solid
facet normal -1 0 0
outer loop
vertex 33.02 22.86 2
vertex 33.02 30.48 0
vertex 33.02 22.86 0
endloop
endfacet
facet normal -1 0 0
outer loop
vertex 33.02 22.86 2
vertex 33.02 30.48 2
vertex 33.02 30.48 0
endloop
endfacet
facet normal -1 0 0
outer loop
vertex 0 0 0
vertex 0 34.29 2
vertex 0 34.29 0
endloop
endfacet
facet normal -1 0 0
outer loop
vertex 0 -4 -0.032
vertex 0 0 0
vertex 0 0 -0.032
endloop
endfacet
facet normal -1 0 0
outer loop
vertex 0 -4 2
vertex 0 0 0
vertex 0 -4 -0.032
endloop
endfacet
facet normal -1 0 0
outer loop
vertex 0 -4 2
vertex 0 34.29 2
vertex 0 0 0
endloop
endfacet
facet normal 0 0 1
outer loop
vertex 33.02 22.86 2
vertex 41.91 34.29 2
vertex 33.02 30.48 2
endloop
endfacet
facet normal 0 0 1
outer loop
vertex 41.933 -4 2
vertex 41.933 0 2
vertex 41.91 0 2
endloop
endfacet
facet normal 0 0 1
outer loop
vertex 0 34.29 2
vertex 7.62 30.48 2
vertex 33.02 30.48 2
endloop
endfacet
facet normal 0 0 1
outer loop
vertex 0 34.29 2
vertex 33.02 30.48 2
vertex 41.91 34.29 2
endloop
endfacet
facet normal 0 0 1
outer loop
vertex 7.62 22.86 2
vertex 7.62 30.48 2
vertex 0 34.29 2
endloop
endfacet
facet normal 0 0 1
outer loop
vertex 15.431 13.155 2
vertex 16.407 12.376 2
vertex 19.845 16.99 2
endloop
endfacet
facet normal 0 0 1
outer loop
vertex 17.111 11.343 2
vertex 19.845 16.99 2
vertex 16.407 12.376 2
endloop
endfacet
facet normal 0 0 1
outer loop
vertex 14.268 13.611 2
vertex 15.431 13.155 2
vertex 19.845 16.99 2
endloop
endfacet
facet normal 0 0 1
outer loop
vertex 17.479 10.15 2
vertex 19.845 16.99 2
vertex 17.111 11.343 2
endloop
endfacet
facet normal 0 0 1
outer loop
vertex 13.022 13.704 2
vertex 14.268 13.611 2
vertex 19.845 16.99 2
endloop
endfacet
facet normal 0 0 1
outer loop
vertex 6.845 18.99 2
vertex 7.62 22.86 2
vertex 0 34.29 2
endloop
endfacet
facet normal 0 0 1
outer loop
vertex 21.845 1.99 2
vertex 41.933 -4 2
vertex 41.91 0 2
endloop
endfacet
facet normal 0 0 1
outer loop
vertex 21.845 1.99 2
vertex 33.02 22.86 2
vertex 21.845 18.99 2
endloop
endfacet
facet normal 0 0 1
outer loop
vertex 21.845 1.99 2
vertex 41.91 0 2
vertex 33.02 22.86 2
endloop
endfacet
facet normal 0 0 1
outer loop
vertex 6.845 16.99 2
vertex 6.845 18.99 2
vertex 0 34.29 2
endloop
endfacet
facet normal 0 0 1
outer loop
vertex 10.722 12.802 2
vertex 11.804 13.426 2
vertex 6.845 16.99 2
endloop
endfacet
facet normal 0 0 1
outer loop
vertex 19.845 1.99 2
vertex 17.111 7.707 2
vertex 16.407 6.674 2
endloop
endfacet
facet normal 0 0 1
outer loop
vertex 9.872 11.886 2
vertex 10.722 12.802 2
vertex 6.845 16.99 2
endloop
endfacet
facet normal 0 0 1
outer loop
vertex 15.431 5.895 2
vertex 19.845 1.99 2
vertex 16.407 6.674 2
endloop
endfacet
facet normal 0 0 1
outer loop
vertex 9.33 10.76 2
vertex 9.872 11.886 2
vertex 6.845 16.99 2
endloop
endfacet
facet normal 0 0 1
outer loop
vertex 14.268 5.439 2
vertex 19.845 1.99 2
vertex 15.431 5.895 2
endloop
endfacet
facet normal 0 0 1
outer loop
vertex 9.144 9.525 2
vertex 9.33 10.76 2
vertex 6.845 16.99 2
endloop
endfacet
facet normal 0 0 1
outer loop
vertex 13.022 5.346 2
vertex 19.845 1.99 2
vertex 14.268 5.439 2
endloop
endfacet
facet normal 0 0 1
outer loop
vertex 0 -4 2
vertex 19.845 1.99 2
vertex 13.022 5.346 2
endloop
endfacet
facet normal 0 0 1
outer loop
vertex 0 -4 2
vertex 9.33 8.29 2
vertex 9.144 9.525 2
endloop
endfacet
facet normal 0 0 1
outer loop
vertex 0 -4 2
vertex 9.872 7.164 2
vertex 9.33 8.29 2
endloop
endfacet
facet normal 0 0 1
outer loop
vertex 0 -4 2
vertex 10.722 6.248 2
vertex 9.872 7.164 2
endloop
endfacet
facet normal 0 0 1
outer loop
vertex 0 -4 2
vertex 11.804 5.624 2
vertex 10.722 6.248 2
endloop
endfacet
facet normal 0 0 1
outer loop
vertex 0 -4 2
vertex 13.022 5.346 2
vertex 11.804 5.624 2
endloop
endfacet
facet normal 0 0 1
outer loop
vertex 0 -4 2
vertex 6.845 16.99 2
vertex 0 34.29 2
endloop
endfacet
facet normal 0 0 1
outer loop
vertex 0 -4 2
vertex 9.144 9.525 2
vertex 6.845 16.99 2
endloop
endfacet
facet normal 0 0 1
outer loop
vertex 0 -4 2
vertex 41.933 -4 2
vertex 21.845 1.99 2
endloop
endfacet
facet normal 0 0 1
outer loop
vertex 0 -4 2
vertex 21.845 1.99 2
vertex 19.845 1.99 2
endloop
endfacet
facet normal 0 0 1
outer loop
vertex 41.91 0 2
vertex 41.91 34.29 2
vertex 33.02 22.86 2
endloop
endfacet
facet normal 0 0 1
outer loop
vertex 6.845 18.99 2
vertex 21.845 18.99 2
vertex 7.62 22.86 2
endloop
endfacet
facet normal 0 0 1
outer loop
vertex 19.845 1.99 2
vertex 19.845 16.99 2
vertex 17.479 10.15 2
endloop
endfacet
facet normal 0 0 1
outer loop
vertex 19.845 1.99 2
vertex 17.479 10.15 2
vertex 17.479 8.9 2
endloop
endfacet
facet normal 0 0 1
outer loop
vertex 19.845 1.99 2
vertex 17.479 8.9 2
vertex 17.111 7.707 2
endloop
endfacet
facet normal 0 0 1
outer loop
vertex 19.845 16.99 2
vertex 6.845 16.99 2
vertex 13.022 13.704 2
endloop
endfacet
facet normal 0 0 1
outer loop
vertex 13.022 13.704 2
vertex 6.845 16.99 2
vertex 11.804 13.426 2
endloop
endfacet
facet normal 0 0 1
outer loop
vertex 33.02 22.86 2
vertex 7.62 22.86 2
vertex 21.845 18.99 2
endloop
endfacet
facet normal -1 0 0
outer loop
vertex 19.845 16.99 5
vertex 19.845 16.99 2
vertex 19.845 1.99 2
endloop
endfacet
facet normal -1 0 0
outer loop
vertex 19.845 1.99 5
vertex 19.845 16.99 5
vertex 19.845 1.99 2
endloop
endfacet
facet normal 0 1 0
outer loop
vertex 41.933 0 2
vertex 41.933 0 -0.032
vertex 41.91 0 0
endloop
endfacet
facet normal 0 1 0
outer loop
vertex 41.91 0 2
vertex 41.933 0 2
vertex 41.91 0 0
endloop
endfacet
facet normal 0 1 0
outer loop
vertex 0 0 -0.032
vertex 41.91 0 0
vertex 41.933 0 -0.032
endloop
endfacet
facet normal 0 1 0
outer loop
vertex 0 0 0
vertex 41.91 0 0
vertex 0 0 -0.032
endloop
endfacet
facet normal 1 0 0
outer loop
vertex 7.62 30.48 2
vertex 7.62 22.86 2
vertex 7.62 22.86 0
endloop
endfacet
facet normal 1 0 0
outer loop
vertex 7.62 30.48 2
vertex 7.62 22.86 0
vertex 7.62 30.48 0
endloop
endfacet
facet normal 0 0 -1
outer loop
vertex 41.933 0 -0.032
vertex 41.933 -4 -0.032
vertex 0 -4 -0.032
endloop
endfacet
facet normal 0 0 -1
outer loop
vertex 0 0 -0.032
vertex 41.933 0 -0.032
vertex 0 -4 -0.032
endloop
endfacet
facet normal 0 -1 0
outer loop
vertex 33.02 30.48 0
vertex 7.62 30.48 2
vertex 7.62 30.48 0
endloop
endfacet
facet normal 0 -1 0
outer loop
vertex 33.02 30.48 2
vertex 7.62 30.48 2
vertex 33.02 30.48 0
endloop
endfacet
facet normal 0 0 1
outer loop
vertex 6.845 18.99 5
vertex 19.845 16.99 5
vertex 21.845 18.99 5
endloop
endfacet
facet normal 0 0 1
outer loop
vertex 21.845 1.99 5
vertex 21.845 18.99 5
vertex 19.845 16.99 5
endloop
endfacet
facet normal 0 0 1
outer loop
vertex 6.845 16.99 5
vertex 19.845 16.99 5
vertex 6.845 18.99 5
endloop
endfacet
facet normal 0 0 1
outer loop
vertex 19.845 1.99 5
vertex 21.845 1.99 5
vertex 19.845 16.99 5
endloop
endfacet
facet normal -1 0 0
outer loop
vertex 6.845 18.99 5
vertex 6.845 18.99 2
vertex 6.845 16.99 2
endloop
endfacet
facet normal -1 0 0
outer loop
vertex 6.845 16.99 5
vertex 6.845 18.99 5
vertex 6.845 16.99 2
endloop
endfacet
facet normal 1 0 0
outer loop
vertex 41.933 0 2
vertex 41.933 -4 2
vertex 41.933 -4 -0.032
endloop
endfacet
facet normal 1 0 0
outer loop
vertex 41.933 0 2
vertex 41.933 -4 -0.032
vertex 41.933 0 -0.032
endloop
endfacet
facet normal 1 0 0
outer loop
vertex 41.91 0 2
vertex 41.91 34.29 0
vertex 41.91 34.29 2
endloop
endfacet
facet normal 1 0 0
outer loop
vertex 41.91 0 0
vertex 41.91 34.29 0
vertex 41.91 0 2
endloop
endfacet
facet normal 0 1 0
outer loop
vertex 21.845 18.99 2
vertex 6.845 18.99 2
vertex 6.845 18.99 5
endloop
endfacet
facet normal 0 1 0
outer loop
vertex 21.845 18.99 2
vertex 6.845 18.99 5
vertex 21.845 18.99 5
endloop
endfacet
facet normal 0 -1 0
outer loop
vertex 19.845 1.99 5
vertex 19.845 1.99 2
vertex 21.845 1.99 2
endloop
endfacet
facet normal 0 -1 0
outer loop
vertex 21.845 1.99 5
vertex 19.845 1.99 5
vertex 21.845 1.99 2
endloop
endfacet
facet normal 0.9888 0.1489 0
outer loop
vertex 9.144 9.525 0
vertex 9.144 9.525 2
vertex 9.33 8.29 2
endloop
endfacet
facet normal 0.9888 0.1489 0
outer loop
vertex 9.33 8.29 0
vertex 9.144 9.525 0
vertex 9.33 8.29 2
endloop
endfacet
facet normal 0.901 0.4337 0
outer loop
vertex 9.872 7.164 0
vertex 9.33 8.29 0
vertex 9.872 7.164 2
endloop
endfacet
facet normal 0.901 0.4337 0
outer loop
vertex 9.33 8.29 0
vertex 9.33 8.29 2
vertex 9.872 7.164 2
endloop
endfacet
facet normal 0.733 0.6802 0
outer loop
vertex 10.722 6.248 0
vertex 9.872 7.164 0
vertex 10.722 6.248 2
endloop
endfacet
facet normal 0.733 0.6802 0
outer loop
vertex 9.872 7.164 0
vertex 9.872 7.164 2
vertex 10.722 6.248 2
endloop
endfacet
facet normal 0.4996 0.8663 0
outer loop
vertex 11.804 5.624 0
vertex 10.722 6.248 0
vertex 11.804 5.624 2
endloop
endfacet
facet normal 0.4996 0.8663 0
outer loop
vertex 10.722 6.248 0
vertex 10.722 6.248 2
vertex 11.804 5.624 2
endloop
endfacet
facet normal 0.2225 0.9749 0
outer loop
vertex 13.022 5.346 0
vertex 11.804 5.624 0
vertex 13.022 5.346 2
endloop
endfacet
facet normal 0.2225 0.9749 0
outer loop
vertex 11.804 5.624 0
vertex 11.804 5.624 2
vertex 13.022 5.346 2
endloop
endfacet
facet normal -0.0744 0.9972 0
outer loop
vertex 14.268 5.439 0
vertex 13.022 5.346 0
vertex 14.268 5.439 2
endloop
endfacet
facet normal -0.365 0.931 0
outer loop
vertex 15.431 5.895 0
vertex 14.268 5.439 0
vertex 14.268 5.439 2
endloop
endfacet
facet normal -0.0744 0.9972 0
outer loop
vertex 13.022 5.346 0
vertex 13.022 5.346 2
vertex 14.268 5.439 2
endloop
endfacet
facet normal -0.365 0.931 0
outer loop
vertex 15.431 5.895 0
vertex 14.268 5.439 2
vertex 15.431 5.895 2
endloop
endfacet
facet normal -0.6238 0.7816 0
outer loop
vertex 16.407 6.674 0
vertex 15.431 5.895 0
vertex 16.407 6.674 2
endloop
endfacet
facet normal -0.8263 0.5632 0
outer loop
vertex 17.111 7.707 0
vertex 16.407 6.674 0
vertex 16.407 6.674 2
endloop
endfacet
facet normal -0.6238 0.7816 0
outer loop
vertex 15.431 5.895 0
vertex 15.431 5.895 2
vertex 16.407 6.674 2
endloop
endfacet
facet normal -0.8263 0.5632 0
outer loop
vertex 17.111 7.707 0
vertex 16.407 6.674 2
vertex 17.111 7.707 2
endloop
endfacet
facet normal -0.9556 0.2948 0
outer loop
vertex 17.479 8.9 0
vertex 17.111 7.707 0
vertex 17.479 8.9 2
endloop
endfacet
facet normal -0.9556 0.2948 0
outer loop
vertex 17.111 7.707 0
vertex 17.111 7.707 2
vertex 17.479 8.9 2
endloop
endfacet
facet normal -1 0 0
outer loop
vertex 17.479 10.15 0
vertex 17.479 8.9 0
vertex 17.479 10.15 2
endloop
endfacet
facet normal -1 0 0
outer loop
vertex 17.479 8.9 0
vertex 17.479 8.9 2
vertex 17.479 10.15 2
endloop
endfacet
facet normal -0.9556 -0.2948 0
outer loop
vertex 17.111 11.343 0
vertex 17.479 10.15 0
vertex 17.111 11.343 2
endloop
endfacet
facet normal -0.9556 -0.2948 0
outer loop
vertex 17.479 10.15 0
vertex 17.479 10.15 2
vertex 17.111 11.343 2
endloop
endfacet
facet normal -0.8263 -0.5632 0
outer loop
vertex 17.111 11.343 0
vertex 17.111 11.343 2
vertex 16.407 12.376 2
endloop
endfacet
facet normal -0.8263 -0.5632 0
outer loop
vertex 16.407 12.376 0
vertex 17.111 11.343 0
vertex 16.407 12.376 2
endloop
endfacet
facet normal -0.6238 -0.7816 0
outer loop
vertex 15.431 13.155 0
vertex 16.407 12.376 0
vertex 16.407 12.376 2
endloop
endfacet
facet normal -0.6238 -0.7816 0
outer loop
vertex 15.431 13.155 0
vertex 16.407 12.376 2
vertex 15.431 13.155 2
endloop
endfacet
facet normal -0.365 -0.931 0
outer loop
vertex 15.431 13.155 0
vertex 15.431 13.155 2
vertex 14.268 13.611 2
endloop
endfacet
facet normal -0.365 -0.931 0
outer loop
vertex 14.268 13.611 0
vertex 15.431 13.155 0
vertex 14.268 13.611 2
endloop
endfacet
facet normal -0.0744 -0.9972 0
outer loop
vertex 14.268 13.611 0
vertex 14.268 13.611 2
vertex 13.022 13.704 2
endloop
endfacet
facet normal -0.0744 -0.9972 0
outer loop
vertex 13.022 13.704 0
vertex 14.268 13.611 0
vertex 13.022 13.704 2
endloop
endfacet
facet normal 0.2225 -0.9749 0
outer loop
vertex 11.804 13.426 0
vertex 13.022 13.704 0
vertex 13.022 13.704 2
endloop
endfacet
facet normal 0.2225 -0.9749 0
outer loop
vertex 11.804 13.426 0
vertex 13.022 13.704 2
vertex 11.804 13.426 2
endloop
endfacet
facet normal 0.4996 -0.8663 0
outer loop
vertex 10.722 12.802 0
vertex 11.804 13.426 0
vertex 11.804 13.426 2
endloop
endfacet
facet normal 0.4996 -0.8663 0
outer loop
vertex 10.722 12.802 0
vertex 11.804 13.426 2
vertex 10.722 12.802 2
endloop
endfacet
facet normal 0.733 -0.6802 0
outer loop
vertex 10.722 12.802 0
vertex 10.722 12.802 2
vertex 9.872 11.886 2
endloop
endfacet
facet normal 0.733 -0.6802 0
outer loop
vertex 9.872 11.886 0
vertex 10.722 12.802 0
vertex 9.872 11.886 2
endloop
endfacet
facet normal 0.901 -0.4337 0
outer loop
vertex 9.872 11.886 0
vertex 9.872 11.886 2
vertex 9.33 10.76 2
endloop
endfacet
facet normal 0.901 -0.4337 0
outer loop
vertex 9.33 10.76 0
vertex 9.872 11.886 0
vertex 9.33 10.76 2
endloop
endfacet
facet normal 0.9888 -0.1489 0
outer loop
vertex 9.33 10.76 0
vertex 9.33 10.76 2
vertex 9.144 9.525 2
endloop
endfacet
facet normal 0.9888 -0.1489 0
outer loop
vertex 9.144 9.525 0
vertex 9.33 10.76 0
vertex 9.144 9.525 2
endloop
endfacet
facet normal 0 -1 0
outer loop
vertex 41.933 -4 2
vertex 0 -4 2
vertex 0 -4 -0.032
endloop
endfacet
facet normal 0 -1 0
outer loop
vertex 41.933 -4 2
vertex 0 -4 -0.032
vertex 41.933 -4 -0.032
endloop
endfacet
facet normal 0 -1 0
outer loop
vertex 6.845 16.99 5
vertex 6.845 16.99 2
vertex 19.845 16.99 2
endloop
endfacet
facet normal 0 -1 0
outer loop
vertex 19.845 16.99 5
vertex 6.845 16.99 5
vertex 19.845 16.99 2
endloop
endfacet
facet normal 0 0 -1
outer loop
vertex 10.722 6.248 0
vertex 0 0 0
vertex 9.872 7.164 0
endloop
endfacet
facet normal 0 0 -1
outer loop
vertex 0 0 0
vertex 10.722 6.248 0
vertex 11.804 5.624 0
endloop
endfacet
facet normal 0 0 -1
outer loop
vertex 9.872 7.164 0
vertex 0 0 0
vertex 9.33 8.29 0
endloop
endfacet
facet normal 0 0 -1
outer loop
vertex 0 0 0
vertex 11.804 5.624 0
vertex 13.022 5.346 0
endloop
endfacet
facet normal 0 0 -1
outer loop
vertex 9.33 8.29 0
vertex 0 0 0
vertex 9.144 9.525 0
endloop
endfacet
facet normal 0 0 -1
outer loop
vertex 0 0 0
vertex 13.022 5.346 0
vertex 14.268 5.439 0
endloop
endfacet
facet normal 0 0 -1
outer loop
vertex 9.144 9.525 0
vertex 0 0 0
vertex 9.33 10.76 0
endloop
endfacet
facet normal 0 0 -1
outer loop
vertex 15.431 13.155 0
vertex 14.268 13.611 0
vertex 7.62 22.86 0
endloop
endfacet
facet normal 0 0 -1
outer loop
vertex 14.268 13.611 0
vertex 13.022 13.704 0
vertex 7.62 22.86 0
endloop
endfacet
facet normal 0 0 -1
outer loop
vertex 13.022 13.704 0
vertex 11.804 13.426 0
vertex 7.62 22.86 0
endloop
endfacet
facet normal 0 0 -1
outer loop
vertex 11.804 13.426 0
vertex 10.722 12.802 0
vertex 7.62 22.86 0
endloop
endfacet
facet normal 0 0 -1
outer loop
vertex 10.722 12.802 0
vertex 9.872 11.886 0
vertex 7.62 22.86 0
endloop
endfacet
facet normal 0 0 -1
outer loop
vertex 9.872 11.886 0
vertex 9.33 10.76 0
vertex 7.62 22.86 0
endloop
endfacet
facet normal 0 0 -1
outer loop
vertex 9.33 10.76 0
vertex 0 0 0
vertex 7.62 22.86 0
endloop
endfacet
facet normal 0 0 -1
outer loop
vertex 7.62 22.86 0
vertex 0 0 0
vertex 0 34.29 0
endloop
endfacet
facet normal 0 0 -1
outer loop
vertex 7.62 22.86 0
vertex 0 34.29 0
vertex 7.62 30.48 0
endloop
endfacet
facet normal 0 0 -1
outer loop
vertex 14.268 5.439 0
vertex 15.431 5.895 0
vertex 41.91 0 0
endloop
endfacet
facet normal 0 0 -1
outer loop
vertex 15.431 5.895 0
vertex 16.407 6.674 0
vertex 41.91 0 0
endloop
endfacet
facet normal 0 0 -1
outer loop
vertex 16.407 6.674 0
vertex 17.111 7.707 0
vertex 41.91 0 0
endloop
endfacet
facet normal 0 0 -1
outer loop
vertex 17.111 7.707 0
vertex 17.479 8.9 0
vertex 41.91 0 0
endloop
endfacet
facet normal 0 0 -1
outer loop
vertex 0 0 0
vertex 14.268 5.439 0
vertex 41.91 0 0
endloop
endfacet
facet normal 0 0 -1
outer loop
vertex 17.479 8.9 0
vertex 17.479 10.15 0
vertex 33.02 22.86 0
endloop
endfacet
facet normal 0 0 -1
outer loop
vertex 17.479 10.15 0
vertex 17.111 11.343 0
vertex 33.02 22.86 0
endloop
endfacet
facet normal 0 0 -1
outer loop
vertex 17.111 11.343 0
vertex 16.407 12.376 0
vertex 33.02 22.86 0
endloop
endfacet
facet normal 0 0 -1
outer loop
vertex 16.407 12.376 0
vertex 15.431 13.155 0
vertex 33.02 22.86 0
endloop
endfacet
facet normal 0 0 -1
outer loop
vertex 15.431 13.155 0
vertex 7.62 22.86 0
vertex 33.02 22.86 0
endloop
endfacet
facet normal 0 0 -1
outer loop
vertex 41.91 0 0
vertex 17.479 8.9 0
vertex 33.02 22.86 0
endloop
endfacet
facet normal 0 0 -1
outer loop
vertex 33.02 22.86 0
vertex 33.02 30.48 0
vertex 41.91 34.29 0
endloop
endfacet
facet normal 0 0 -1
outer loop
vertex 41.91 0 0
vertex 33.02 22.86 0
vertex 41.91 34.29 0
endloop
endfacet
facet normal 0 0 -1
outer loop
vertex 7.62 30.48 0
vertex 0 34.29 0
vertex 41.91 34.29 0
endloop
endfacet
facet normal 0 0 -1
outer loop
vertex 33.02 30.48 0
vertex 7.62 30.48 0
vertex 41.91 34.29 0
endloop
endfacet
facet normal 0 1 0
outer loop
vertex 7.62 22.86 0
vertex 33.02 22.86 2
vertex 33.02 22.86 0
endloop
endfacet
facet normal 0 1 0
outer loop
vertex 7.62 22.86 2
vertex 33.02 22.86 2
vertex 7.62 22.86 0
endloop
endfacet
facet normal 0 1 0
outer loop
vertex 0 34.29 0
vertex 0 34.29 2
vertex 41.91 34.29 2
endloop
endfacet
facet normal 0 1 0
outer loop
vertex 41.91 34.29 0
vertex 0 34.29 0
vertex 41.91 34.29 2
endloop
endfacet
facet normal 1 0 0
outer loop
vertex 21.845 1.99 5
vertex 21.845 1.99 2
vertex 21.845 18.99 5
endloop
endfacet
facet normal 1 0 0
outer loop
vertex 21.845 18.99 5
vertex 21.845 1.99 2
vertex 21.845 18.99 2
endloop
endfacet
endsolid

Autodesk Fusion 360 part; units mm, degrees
sketch "Sketch1" plane through (0, 0, 0) normal (0, 0, 1) x (1, 0, 0)
  line L0 (0, 0) -> (0, 38.1)
  line L1 (0, 38.1) -> (41.91, 38.1)
  line L2 (41.91, 38.1) -> (41.91, 0)
  line L3 (41.91, 0) -> (0, 0)
  dimension "d1" = 38.1
  dimension "d2" = 41.91
extrude "Extrude1" add sketch "Sketch1" along normal blind 2
sketch "Sketch3" plane through (0, 0, 2) normal (0, 0, 1) x (-1, 0, 0)
  line L0 (-41.91, 0) -> (-41.91, -38.1)
  line L1 (-41.91, -38.1) -> (0, -38.1)
  line L2 (0, -38.1) -> (0, 0)
  line L3 (0, 0) -> (-41.91, 0)
  circle A0 centre (-13.335, -9.525) radius 4.191
  line L4 (-13.335, -9.525) -> (-13.335, -38.1) construction
  line L5 (-13.335, -9.525) -> (-41.91, -9.525) construction
  dimension "d8" = 28.575
  dimension "d9" = 28.575
  dimension "d10" = 8.382
extrude "Extrude3" cut sketch "Sketch3" against normal blind 27.94 contours A0
sketch "Sketch4" plane through (0, 0, 2) normal (0, 0, 1) x (-1, 0, 0)
  circle A0 centre (-13.335, -9.525) radius 4.191
  line L0 (-41.91, 0) -> (-41.91, -38.1)
  line L1 (-41.91, -38.1) -> (0, -38.1)
  line L2 (0, -38.1) -> (0, 0)
  line L3 (0, 0) -> (-41.91, 0)
  line L4 (-12.7, -3.81) -> (-3.81, -3.81)
  line L5 (-12.7, -3.81) -> (-36.4901, -3.81)
  line L6 (-3.81, -34.29) -> (-3.81, -3.81)
  line L7 (-3.81, -34.29) -> (-36.4901, -34.29)
  line L8 (-36.4901, -34.29) -> (-36.4901, -3.81)
  dimension "d13" = 3.81
  dimension "d14" = 3.81
sketch "Sketch5" plane through (0, 0, 2) normal (0, 0, 1) x (-1, 0, 0)
sketch "Sketch6" plane through (0, 0, 2) normal (0, 0, 1) x (-1, 0, 0)
  line L0 (-13.3454, -9.4898) -> (-13.3454, -1.9898)
  line L1 (-13.3454, -9.4898) -> (-13.3454, -16.9898)
  line L2 (-13.3454, -16.9898) -> (-6.8454, -16.9898)
  line L3 (-13.3454, -16.9898) -> (-19.8454, -16.9898)
  line L4 (-6.8454, -16.9898) -> (-6.8454, -1.9898)
  line L5 (-6.8454, -1.9898) -> (-19.8454, -1.9898)
  line L6 (-19.8454, -16.9898) -> (-19.8454, -1.9898)
  line L7 (-6.8454, -18.9898) -> (-21.8454, -18.9898)
  line L8 (-21.8454, -1.9898) -> (-21.8454, -18.9898)
  line L9 (-19.8454, 0.0102) -> (-21.844, 0.0102)
  line L10 (-21.844, 0.0102) -> (-21.8454, -1.9898)
  line L11 (-19.8454, 0.0102) -> (-4.8454, 0.0102)
  line L12 (-6.8454, -18.9898) -> (-6.8454, -18.796)
  line L13 (-6.8454, -18.9898) -> (-4.8454, -18.9898)
  line L14 (-4.8454, -18.9898) -> (-4.8454, 0.0102)
  line L15 (-19.8454, -1.9898) -> (-20.32, -1.9898)
  line L16 (-20.32, -1.9898) -> (-21.8454, -1.9898)
  line L17 (-6.8454, -16.9898) -> (-6.8454, -18.9898)
  dimension "d15" = 7.5
  dimension "d16" = 7.5
  dimension "d17" = 6.5
  dimension "d18" = 6.5
  dimension "d19" = 15
  dimension "d20" = 13
  dimension "d21" = 2
  dimension "d22" = 2
  dimension "d23" = 2
  dimension "d24" = 2
sketch "Sketch8" plane through (0, 0, 2) normal (0, 0, 1) x (-1, 0, 0)
  line L0 (0, -34.29) -> (-41.91, -34.29)
  line L1 (0, -34.29) -> (0, -38.1)
  line L2 (0, -38.1) -> (-41.91, -38.1)
  line L3 (-41.91, -38.1) -> (-41.91, -34.29)
extrude "Extrude4" cut sketch "Sketch8" against normal blind 2.54
sketch "Sketch9" plane through (0, 0, 2) normal (0, 0, 1) x (-1, 0, 0)
  line L0 (0, 0) -> (0, 4)
  line L1 (0, 4) -> (-41.9328, 4)
  line L2 (-41.9328, 4) -> (-41.9328, 0)
  line L3 (-41.9328, 0) -> (0, 0)
  dimension "d27" = 4
extrude "Extrude5" add sketch "Sketch9" against normal blind 2.032
sketch "Sketch10" plane through (0, 0, 2) normal (0, 0, 1) x (-1, 0, 0)
  line L0 (-7.62, -30.48) -> (-33.02, -30.48)
  line L1 (-33.02, -30.48) -> (-33.02, -22.86)
  line L2 (-33.02, -22.86) -> (-7.62, -22.86)
  line L3 (-7.62, -22.86) -> (-7.62, -30.48)
extrude "Extrude6" cut sketch "Sketch10" against normal blind 2.54
extrude "Extrude7" add sketch "Sketch6" along normal blind 3 contours L2 L3 L6 L7 L8 L12 L15 L16 L17
equation "d15 = 15 mm / 2"
equation "d16 = 15 mm / 2"
equation "d17 = 13 mm / 2"
equation "d18 = 13 mm / 2"
